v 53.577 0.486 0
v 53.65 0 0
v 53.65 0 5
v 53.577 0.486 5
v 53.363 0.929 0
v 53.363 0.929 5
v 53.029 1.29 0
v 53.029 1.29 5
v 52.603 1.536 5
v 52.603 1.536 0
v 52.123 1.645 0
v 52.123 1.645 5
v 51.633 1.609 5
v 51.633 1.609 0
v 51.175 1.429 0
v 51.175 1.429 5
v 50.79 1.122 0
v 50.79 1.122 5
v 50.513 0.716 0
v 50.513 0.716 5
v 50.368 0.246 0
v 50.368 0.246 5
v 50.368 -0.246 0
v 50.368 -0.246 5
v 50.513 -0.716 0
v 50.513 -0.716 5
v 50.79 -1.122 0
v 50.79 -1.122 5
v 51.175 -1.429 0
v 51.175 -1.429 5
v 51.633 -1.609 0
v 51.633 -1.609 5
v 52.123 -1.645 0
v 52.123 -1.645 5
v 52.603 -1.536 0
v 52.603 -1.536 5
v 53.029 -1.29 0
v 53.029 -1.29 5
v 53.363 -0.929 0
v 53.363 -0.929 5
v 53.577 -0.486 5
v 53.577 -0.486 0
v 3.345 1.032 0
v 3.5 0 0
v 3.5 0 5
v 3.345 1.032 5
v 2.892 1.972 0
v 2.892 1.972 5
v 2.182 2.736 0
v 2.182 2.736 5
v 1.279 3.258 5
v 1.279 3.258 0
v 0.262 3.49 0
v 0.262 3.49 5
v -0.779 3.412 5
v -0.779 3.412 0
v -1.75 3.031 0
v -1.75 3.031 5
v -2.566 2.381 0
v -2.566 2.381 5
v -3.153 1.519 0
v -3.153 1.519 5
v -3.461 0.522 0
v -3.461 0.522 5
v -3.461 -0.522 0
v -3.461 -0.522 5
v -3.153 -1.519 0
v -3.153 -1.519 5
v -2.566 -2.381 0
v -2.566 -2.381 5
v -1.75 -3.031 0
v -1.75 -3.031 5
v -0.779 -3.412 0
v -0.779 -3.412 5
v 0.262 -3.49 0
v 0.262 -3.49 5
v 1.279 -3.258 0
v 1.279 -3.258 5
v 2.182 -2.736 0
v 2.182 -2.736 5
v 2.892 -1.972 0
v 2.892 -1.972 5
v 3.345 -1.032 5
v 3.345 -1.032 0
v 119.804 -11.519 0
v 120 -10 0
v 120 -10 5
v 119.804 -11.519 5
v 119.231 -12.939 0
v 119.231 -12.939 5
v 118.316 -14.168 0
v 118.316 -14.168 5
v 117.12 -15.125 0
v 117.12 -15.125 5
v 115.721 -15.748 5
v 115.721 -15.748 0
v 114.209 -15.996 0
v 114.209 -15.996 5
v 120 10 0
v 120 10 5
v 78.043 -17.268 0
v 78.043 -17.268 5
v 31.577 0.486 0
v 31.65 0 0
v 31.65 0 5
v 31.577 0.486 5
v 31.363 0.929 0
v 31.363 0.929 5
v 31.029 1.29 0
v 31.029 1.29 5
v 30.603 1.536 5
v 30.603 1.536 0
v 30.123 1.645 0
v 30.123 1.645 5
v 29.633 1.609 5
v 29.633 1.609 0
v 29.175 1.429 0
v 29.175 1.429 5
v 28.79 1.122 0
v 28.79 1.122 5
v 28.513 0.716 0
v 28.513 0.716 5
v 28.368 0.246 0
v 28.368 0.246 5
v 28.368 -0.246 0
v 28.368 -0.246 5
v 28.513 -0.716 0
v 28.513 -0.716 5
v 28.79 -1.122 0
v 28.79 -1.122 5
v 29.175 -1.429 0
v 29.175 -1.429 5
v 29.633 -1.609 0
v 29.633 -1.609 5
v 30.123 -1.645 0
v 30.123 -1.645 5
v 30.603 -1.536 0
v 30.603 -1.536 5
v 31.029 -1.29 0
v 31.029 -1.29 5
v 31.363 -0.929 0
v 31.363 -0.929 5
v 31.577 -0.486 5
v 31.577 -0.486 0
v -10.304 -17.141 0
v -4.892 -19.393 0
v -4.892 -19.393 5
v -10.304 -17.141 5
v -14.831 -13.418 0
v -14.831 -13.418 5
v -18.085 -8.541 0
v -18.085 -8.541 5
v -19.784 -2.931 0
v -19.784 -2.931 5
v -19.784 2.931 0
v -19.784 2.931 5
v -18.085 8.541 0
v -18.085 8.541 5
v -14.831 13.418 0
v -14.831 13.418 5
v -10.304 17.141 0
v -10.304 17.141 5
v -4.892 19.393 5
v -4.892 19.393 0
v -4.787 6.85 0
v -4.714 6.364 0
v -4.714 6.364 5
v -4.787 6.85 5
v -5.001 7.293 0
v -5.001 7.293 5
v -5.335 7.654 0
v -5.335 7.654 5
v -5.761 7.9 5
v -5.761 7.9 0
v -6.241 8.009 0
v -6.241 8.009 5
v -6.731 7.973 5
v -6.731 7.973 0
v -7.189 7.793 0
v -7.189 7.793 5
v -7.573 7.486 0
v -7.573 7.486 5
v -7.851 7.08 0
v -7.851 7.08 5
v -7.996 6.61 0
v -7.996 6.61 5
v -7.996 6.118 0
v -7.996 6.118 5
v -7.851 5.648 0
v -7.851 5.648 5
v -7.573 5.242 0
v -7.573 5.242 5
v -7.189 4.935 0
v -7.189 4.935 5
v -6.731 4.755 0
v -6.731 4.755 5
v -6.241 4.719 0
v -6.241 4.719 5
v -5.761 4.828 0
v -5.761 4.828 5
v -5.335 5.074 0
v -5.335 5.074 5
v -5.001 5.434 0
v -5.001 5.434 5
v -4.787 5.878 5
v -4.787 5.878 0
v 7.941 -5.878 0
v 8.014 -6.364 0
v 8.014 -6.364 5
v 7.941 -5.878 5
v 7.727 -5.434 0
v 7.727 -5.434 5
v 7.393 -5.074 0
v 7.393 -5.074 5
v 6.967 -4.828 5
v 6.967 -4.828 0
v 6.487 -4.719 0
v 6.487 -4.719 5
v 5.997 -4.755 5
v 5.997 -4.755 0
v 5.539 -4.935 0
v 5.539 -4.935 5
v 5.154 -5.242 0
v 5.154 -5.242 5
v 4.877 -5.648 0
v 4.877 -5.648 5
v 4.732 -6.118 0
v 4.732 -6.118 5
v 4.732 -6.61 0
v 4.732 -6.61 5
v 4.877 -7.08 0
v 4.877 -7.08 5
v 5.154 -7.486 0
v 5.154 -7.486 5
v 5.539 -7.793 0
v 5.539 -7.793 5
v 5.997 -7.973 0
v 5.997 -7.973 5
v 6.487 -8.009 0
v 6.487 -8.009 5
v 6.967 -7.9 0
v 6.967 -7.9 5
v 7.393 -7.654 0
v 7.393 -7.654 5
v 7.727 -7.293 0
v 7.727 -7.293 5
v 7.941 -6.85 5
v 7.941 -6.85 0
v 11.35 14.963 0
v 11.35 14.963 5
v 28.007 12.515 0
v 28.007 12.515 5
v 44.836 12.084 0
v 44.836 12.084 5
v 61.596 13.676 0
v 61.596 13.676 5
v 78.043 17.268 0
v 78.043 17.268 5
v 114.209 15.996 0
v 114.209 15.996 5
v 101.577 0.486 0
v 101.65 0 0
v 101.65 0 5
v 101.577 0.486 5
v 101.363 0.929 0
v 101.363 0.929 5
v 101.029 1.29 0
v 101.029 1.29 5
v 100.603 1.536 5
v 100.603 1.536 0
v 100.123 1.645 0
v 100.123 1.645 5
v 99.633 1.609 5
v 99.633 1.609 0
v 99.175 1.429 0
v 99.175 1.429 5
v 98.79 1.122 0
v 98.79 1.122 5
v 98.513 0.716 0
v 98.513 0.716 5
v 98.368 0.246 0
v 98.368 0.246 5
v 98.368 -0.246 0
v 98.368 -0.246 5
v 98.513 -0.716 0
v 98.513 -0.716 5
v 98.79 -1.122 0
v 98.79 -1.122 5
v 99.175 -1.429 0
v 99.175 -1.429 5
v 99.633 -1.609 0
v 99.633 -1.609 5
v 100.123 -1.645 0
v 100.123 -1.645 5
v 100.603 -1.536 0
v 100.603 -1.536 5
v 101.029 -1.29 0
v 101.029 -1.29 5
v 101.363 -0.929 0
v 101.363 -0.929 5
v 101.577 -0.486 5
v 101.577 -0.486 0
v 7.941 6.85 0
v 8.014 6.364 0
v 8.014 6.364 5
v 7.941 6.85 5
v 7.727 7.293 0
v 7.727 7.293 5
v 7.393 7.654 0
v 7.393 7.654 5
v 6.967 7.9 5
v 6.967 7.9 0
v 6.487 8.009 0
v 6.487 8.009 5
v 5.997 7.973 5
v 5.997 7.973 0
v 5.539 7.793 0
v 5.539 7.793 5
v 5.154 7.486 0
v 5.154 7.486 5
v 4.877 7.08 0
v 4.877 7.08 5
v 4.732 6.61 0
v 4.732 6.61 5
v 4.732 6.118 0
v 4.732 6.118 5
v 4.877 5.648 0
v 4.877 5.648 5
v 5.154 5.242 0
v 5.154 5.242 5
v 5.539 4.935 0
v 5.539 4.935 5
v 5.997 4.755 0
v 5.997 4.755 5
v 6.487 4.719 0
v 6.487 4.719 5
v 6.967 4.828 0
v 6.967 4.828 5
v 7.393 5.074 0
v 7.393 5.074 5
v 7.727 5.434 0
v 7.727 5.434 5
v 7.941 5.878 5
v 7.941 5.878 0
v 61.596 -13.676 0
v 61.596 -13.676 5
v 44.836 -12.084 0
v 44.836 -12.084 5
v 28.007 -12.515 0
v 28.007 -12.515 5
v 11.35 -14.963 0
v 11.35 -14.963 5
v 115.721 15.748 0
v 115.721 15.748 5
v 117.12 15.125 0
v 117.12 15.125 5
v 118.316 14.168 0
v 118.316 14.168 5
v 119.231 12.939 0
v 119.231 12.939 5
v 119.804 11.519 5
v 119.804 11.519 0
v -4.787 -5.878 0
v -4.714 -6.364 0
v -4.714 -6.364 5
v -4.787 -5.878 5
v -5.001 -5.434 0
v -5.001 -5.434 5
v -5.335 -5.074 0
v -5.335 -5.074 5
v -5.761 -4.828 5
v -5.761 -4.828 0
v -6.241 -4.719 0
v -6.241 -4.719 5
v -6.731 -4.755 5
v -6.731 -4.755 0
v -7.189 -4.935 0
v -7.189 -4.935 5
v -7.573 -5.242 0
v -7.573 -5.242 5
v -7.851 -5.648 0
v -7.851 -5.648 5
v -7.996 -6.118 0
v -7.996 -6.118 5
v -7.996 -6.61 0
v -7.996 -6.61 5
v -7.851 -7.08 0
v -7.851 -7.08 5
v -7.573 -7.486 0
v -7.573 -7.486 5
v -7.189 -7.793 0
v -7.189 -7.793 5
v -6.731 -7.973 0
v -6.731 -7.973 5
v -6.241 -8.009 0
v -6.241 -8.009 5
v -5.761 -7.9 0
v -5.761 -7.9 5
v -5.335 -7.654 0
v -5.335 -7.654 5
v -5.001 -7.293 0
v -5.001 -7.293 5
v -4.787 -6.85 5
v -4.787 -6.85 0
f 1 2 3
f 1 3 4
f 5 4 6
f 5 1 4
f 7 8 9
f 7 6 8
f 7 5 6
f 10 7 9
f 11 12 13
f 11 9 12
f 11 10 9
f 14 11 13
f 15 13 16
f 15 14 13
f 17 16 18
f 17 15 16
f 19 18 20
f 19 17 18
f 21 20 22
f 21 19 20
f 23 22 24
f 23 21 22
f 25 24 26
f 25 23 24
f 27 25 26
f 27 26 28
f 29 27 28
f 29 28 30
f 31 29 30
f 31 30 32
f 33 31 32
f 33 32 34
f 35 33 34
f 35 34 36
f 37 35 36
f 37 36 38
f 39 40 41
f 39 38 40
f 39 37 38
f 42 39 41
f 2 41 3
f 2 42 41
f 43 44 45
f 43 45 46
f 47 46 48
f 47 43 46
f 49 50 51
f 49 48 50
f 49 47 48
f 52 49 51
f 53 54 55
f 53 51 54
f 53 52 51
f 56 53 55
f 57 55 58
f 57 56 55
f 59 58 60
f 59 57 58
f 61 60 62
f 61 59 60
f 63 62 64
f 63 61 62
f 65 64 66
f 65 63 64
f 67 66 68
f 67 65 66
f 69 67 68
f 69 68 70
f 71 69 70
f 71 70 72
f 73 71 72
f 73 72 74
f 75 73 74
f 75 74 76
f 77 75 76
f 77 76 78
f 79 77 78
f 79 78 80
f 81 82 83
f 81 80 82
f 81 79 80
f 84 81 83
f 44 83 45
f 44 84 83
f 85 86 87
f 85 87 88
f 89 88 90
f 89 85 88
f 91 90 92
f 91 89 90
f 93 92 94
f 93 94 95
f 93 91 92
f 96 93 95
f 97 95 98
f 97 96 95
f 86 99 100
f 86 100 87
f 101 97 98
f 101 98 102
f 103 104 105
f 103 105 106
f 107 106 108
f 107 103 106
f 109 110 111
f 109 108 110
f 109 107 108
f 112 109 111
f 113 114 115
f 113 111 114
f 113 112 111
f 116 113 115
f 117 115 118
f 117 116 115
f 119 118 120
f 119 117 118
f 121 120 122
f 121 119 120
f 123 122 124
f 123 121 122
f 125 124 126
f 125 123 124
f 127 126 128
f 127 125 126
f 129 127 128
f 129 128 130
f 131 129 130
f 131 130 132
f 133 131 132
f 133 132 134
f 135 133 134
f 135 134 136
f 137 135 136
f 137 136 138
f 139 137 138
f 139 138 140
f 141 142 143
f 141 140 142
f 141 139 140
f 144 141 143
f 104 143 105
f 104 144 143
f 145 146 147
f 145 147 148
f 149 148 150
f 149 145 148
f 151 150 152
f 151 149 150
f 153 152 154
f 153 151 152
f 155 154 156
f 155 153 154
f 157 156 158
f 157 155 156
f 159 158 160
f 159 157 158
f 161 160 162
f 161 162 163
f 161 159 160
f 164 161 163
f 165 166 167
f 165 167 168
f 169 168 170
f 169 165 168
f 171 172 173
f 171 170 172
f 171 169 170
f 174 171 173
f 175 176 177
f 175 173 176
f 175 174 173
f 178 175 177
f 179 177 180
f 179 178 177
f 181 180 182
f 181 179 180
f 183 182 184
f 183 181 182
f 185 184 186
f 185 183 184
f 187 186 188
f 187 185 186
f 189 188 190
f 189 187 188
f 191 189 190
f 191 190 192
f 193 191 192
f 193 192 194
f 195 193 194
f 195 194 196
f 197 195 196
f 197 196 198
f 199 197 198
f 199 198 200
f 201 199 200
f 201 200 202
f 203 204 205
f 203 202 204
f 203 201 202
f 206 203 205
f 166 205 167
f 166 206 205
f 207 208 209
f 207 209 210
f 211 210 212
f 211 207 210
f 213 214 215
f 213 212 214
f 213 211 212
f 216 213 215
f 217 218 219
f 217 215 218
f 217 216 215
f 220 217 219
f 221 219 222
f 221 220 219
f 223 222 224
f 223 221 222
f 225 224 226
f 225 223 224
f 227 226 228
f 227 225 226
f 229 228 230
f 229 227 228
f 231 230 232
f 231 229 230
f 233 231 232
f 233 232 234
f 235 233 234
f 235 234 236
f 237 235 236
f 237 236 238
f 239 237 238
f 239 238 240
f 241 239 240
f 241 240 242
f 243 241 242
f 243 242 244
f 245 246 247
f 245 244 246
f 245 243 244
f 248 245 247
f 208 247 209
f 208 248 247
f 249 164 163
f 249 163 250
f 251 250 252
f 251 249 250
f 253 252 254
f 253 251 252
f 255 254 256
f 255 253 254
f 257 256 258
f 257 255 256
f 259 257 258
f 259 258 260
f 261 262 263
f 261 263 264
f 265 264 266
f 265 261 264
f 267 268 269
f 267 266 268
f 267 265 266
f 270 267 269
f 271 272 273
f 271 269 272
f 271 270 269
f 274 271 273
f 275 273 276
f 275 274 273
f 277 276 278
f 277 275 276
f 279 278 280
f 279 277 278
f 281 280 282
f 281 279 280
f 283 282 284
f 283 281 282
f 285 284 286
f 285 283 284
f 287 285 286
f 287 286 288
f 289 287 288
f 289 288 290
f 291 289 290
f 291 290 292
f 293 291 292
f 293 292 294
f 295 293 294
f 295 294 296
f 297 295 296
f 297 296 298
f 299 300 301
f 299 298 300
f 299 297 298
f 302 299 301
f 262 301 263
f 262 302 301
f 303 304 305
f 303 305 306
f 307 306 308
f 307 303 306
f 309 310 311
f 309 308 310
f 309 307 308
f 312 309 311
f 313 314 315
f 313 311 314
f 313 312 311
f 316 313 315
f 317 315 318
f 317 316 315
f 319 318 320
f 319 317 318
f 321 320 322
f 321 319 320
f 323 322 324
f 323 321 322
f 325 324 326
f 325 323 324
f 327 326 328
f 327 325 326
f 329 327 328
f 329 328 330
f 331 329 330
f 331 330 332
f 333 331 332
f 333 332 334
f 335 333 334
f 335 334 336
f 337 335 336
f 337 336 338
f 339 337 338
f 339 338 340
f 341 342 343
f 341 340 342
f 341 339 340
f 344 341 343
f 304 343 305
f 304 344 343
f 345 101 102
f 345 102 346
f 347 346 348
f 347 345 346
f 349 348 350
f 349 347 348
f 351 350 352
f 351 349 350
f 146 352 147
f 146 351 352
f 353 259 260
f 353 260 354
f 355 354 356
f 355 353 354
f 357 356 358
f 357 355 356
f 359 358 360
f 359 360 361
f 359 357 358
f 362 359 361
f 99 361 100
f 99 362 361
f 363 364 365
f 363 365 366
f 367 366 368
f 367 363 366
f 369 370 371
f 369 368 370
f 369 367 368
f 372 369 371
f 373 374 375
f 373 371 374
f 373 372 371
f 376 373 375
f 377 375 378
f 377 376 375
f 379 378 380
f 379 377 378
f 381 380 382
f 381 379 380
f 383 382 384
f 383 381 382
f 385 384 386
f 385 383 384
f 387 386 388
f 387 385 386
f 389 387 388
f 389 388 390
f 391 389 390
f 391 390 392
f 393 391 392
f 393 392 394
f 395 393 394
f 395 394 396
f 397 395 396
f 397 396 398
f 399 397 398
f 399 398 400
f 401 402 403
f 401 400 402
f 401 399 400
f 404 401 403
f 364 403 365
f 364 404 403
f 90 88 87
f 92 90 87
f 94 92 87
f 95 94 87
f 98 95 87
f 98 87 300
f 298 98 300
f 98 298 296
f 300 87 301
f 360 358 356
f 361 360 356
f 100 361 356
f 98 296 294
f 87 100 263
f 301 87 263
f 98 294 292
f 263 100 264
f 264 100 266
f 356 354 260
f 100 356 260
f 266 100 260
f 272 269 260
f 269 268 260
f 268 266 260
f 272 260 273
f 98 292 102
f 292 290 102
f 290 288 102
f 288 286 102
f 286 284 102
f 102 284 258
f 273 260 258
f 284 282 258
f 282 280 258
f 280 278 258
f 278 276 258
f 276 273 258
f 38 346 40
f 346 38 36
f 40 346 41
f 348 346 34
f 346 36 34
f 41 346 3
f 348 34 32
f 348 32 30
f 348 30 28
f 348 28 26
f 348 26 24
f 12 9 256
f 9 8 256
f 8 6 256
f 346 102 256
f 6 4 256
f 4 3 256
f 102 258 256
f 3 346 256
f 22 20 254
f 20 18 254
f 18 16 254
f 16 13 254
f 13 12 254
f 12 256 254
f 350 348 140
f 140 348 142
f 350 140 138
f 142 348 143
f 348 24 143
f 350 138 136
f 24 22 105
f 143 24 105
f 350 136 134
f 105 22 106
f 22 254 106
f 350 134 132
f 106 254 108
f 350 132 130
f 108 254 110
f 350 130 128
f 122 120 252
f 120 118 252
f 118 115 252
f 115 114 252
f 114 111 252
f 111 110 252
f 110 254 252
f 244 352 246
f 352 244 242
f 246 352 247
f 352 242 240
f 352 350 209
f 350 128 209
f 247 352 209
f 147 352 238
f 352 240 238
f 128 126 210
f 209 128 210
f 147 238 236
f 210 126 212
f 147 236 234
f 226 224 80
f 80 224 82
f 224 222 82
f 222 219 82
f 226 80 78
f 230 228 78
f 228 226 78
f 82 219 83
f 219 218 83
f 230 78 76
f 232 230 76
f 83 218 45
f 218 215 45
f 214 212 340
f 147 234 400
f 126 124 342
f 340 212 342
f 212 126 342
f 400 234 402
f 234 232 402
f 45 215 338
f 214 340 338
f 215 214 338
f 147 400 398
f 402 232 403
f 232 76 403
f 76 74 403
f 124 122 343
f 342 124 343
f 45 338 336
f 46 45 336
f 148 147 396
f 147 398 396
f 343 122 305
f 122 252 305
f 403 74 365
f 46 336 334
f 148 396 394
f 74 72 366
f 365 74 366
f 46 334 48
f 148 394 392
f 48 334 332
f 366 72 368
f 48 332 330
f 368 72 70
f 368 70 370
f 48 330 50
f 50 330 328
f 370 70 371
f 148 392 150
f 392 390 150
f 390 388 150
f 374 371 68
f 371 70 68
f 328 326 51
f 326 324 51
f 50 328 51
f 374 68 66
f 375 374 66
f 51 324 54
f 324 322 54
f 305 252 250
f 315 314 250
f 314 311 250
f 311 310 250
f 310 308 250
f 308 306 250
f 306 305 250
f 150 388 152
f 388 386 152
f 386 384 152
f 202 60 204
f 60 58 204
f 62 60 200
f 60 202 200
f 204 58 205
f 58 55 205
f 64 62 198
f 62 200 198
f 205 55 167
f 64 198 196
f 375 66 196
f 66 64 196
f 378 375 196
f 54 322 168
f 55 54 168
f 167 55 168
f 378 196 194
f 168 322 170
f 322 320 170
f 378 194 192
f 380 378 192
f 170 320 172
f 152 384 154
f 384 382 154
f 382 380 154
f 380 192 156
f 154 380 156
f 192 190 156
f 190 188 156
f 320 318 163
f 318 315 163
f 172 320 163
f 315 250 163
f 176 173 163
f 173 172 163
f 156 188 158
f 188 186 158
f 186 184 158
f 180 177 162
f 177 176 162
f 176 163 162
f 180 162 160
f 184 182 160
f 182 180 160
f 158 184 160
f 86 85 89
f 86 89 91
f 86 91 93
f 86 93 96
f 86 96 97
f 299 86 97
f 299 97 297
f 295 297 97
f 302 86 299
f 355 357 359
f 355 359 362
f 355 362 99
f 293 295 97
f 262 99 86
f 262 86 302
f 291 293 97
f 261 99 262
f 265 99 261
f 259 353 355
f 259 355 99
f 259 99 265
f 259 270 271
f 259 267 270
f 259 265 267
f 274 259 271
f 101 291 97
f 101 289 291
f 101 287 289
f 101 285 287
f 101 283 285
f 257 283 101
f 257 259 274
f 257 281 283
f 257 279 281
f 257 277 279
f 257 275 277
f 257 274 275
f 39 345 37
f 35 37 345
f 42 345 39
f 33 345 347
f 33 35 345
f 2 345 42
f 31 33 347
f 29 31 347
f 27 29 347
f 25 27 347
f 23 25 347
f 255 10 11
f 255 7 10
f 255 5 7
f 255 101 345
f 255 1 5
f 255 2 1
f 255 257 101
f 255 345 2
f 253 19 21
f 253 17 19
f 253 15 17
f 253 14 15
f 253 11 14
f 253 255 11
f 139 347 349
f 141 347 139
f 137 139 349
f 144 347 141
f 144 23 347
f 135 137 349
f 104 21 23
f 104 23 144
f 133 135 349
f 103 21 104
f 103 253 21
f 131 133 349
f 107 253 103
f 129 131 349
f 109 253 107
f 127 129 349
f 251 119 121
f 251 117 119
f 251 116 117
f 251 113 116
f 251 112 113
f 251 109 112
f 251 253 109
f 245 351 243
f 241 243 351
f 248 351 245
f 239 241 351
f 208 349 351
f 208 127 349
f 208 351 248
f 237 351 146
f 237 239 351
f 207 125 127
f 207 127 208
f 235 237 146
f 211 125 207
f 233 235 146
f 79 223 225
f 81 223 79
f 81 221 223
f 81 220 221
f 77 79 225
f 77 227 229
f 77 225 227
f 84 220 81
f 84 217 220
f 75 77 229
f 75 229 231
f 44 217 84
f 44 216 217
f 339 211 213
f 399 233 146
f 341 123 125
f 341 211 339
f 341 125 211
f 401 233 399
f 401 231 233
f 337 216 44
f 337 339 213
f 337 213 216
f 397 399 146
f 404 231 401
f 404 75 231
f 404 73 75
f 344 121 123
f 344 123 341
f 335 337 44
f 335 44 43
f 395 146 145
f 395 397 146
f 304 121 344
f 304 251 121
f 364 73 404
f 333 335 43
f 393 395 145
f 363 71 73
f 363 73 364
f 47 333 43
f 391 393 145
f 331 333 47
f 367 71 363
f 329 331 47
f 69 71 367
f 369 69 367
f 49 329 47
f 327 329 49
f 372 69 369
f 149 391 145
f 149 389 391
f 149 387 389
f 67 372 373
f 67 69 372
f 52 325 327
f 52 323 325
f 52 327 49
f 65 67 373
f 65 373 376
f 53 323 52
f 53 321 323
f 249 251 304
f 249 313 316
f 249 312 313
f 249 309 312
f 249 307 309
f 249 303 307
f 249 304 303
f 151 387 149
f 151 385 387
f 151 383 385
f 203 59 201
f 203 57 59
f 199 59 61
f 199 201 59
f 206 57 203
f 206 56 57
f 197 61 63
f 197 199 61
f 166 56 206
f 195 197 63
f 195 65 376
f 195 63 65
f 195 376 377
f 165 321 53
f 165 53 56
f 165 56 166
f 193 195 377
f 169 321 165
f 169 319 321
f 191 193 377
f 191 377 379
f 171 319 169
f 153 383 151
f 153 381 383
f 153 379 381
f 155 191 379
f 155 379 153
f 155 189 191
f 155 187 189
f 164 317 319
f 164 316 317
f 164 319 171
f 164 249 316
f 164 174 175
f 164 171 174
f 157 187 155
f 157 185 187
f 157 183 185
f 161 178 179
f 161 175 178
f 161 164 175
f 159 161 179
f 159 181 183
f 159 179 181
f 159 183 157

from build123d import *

# Parameters (mm, degrees)
PLASTINA_DEPTH        = 5
OTVERSTIYA_DEPTH      = 122.659652126
OTVERSTIYA_DEPTH_BACK = 122.659652126
ESKIZ_OTVERSTIYA_R    = 1.65
ESKIZ_OTVERSTIYA_R_2  = 3.5


with BuildPart() as part:
    # Eskiz_kontur → Plastina (new body)
    with BuildSketch(Plane.XY):
        with BuildLine():
            Line((78.04349, 17.26807), (114.2094, 15.99634))
            ThreePointArc((114.2094, 15.99634), (118.316039529, 14.167943464), (119.999997488, 9.999993404))
            Line((119.999997488, 9.999993404), (119.999997488, -10.000006596))
            ThreePointArc((119.999997488, -10.000006596), (118.31603808, -14.167953985), (114.2094, -15.996349022))
            Line((114.2094, -15.996349022), (78.04349, -17.268079022))
            ThreePointArc((78.04349, -17.268079022), (36.414907375, -12.045919499), (-4.891710116, -19.392564511))
            ThreePointArc((-4.891710116, -19.392564511), (-20.000005367, -4.511e-06), (-4.891710116, 19.392555489))
            ThreePointArc((-4.891710116, 19.392555489), (36.414907375, 12.045910477), (78.04349, 17.26807))
        make_face()
    extrude(amount=PLASTINA_DEPTH)

    # Eskiz_otverstiya → Otverstiya (cut, two sides: drawn at the far end of the back side and taken through both)
    with BuildSketch(Plane.XY.offset(-OTVERSTIYA_DEPTH_BACK)):
        with Locations((-6.36396, -6.36396)):
            Circle(ESKIZ_OTVERSTIYA_R)
        with Locations((6.36396, -6.36396)):
            Circle(ESKIZ_OTVERSTIYA_R)
        Circle(ESKIZ_OTVERSTIYA_R_2)
        with Locations((30, 0)):
            Circle(ESKIZ_OTVERSTIYA_R)
        with Locations((-6.36396, 6.36396)):
            Circle(ESKIZ_OTVERSTIYA_R)
        with Locations((6.36396, 6.36396)):
            Circle(ESKIZ_OTVERSTIYA_R)
        with Locations((52, 0)):
            Circle(ESKIZ_OTVERSTIYA_R)
        with Locations((100, 0)):
            Circle(ESKIZ_OTVERSTIYA_R)
    extrude(amount=OTVERSTIYA_DEPTH + OTVERSTIYA_DEPTH_BACK, mode=Mode.SUBTRACT)


solid = part.part
